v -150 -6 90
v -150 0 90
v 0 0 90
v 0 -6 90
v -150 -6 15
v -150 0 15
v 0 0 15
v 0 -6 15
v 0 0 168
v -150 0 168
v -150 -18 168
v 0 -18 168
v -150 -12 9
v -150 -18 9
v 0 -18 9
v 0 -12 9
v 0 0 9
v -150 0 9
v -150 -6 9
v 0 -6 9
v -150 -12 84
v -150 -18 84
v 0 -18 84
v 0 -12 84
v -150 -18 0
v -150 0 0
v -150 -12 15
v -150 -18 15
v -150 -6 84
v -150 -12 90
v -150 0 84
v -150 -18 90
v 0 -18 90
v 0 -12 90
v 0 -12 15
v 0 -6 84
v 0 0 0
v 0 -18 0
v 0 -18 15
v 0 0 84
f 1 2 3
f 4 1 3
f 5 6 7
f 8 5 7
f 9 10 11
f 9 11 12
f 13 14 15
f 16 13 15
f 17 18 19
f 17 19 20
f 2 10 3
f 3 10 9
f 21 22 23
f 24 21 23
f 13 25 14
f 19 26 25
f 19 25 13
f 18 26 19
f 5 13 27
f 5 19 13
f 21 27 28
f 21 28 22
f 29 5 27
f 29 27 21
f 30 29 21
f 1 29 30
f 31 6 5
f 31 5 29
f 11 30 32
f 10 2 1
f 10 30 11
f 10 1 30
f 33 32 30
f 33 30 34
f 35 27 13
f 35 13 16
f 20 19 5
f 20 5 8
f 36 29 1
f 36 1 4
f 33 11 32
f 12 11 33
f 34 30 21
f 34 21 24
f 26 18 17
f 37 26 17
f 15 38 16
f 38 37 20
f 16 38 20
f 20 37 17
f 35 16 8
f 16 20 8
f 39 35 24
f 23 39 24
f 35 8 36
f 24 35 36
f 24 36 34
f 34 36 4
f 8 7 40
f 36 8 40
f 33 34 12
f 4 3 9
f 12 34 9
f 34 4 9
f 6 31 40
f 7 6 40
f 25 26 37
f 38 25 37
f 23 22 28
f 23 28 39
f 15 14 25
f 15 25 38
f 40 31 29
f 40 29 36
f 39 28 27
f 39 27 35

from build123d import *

# Parameters (mm, degrees)
SKETCH_W        = 150
SKETCH_H        = 168
PAD_DEPTH       = 18
SKETCH001_W     = 150
SKETCH001_H     = 6
POCKET_DEPTH    = 6
SKETCH002_W     = 150
SKETCH002_H     = 6
POCKET001_DEPTH = 6


with BuildPart() as part:
    # Sketch → Pad (new body)
    with BuildSketch(Plane.XZ):
        with Locations((-75, 84)):
            Rectangle(SKETCH_W, SKETCH_H)
    extrude(amount=PAD_DEPTH)

    # Sketch001 (on Face6 of Pad) → Pocket (cut)
    with BuildSketch(Plane.XZ.offset(18)):
        with Locations((-75, 12)):
            Rectangle(SKETCH001_W, SKETCH001_H)
        with Locations((-75, 87)):
            Rectangle(SKETCH001_W, SKETCH001_H)
    extrude(amount=-POCKET_DEPTH, mode=Mode.SUBTRACT)

    # Sketch002 (on Face4 of Pocket) → Pocket001 (cut)
    with BuildSketch(Plane(origin=(0, 0, 0), x_dir=(1, 0, 0), z_dir=(0, 1, 0))):
        with Locations((-75, -12)):
            Rectangle(SKETCH002_W, SKETCH002_H)
        with Locations((-75, -87)):
            Rectangle(SKETCH002_W, SKETCH002_H)
    extrude(amount=-POCKET001_DEPTH, mode=Mode.SUBTRACT)


solid = part.part
